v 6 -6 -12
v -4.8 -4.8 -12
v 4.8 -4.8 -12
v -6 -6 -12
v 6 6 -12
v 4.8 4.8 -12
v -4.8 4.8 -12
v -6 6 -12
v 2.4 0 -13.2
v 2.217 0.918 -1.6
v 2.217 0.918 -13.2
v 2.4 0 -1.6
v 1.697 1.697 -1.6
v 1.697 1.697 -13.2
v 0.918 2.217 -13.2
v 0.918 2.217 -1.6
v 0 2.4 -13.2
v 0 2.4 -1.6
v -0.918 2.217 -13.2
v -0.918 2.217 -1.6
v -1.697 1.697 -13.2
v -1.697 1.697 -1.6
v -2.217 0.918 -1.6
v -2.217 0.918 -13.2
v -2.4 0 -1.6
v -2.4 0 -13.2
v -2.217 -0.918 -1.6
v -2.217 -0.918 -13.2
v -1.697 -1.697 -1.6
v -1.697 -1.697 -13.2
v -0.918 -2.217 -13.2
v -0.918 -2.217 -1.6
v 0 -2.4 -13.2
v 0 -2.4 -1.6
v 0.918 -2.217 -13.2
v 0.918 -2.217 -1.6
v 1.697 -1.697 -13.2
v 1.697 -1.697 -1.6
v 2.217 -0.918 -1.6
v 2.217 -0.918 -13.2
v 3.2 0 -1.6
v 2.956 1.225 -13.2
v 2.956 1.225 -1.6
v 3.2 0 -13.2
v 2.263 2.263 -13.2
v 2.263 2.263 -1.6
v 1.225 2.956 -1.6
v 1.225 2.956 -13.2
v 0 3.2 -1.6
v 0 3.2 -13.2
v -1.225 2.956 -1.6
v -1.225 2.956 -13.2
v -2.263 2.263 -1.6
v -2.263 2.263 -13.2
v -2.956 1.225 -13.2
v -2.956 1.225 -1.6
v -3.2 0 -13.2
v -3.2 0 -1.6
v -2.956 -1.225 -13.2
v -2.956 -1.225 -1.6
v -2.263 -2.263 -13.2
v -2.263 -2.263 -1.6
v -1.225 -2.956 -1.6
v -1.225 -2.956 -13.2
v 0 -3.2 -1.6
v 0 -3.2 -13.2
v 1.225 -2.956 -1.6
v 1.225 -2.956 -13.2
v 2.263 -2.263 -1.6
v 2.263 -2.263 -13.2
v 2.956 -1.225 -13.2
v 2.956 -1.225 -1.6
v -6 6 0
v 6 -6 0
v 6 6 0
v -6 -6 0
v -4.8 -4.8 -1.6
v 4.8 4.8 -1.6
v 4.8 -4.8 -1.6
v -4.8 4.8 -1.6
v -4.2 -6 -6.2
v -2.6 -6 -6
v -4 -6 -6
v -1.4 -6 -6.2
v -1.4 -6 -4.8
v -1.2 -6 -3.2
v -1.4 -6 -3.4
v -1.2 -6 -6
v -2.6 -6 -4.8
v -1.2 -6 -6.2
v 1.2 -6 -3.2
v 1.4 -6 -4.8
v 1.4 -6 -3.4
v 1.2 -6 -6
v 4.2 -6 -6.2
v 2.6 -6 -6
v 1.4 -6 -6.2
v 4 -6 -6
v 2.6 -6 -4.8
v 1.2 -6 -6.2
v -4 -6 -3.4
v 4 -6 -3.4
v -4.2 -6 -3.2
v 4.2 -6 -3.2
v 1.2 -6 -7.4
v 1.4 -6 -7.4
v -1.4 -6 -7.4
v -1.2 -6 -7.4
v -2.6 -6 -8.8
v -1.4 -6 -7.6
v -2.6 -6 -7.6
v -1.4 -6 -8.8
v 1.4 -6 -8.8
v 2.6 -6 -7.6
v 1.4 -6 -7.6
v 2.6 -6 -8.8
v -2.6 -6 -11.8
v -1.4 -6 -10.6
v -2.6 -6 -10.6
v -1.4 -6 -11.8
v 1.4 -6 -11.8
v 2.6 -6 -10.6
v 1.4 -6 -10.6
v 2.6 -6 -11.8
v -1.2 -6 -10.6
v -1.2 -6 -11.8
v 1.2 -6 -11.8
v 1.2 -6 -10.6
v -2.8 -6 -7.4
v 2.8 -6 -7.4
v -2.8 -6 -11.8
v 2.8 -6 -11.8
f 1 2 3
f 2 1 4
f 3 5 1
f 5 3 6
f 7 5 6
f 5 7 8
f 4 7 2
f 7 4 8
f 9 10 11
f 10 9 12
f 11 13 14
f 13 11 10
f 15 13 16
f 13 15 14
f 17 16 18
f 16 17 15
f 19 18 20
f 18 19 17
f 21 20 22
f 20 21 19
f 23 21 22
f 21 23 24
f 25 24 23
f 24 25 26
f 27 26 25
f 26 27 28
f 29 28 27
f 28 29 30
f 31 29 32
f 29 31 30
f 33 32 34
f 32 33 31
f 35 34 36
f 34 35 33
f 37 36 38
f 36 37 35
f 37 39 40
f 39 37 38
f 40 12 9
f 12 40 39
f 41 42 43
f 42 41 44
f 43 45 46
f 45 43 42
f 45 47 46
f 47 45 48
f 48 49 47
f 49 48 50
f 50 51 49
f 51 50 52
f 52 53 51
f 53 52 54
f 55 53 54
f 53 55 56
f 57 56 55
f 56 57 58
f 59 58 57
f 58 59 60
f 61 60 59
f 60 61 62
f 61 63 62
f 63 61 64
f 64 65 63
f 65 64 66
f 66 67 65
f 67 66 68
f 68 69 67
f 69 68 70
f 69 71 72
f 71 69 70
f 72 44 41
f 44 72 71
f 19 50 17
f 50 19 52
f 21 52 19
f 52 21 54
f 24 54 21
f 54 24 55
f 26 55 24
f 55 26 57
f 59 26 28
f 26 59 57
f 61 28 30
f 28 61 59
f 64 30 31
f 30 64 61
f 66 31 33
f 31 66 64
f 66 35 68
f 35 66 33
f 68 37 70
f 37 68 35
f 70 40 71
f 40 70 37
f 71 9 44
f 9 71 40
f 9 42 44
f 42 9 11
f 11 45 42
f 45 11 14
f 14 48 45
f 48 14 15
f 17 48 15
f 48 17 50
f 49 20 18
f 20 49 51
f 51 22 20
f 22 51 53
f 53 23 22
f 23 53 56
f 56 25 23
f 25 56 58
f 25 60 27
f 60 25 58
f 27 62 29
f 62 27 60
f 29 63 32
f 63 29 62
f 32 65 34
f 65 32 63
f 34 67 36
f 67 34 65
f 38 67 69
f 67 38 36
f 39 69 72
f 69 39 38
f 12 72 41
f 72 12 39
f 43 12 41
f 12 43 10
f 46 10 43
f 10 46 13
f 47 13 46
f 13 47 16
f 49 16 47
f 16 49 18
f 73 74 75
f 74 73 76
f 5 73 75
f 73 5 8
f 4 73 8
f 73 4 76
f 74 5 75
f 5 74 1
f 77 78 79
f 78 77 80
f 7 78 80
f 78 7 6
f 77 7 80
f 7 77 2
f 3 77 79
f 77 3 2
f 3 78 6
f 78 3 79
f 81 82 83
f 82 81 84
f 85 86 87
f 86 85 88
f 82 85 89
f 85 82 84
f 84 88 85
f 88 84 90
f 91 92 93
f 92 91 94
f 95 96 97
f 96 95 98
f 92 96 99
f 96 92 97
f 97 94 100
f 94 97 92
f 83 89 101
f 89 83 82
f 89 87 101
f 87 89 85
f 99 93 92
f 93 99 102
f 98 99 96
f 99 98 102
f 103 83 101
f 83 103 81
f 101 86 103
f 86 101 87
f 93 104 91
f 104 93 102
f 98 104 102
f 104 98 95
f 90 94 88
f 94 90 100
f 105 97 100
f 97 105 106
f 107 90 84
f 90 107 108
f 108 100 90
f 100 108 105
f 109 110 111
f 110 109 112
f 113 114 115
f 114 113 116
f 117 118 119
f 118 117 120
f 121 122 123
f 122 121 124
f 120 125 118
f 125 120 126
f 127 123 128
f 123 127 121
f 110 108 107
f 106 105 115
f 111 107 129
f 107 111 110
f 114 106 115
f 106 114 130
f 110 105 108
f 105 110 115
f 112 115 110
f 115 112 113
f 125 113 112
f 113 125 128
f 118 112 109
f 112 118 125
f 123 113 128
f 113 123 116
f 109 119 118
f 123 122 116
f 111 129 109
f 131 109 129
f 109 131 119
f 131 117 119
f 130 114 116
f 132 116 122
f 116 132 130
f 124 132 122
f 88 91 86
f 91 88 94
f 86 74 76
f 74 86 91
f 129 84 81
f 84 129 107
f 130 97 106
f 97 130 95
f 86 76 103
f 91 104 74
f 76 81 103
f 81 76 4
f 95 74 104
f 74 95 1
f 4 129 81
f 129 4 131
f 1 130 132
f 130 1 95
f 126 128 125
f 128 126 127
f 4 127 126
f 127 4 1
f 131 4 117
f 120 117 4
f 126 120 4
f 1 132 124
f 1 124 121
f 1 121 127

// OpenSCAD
// file: ../p/4-4ring3.scad
use <../lib.scad>
$fa=1; $fs=0.2;
function ldraw_lib__4_4ring3(realsolid=false) = [
// 0 Ring  3 x 1.0
// 0 Name: 4-4ring3.dat
// 0 Author: James Jessiman
// 0 !LDRAW_ORG Primitive UPDATE 2009-01
// 0 !LICENSE Licensed under CC BY 2.0 and CC BY 4.0 : see CAreadme.txt
// 
// 0 BFC CERTIFY CCW
  [0,"BFC","CERTIFY"],
  [0,"BFC","CCW"],
// 
// 0 !HISTORY 1998-12-15 [PTadmin] Official Update 1998-10
// 0 !HISTORY 2002-04-05 [hafhead] Added BFC statement
// 0 !HISTORY 2002-04-25 [PTadmin] Official Update 2002-02
// 0 !HISTORY 2007-06-24 [PTadmin] Header formatted for Contributor Agreement
// 0 !HISTORY 2008-07-01 [PTadmin] Official Update 2008-01
// 0 !HISTORY 2008-08-26 [cwdee] Switch polygon winding and rename
// 0 !HISTORY 2009-05-02 [PTadmin] Official Update 2009-01
// 
// 
// 4 16 -1.5308 0 3.6956 -1.1481 0 2.7717 0 0 3 0 0 4
  [4,16,-1.5308,0,3.6956,-1.1481,0,2.7717,0,0,3,0,0,4],
// 4 16 -2.8284 0 2.8284 -2.1213 0 2.1213 -1.1481 0 2.7717 -1.5308 0 3.6956
  [4,16,-2.8284,0,2.8284,-2.1213,0,2.1213,-1.1481,0,2.7717,-1.5308,0,3.6956],
// 4 16 -3.6956 0 1.5308 -2.7717 0 1.1481 -2.1213 0 2.1213 -2.8284 0 2.8284
  [4,16,-3.6956,0,1.5308,-2.7717,0,1.1481,-2.1213,0,2.1213,-2.8284,0,2.8284],
// 4 16 -4 0 0 -3 0 0 -2.7717 0 1.1481 -3.6956 0 1.5308
  [4,16,-4,0,0,-3,0,0,-2.7717,0,1.1481,-3.6956,0,1.5308],
// 4 16 -3.6956 0 -1.5308 -2.7717 0 -1.1481 -3 0 0 -4 0 0
  [4,16,-3.6956,0,-1.5308,-2.7717,0,-1.1481,-3,0,0,-4,0,0],
// 4 16 -2.8284 0 -2.8284 -2.1213 0 -2.1213 -2.7717 0 -1.1481 -3.6956 0 -1.5308
  [4,16,-2.8284,0,-2.8284,-2.1213,0,-2.1213,-2.7717,0,-1.1481,-3.6956,0,-1.5308],
// 4 16 -1.5308 0 -3.6956 -1.1481 0 -2.7717 -2.1213 0 -2.1213 -2.8284 0 -2.8284
  [4,16,-1.5308,0,-3.6956,-1.1481,0,-2.7717,-2.1213,0,-2.1213,-2.8284,0,-2.8284],
// 4 16 0 0 -4 0 0 -3 -1.1481 0 -2.7717 -1.5308 0 -3.6956
  [4,16,0,0,-4,0,0,-3,-1.1481,0,-2.7717,-1.5308,0,-3.6956],
// 4 16 1.5308 0 -3.6956 1.1481 0 -2.7717 0 0 -3 0 0 -4
  [4,16,1.5308,0,-3.6956,1.1481,0,-2.7717,0,0,-3,0,0,-4],
// 4 16 2.8284 0 -2.8284 2.1213 0 -2.1213 1.1481 0 -2.7717 1.5308 0 -3.6956
  [4,16,2.8284,0,-2.8284,2.1213,0,-2.1213,1.1481,0,-2.7717,1.5308,0,-3.6956],
// 4 16 3.6956 0 -1.5308 2.7717 0 -1.1481 2.1213 0 -2.1213 2.8284 0 -2.8284
  [4,16,3.6956,0,-1.5308,2.7717,0,-1.1481,2.1213,0,-2.1213,2.8284,0,-2.8284],
// 4 16 4 0 0 3 0 0 2.7717 0 -1.1481 3.6956 0 -1.5308
  [4,16,4,0,0,3,0,0,2.7717,0,-1.1481,3.6956,0,-1.5308],
// 4 16 3.6956 0 1.5308 2.7717 0 1.1481 3 0 0 4 0 0
  [4,16,3.6956,0,1.5308,2.7717,0,1.1481,3,0,0,4,0,0],
// 4 16 2.8284 0 2.8284 2.1213 0 2.1213 2.7717 0 1.1481 3.6956 0 1.5308
  [4,16,2.8284,0,2.8284,2.1213,0,2.1213,2.7717,0,1.1481,3.6956,0,1.5308],
// 4 16 1.5308 0 3.6956 1.1481 0 2.7717 2.1213 0 2.1213 2.8284 0 2.8284
  [4,16,1.5308,0,3.6956,1.1481,0,2.7717,2.1213,0,2.1213,2.8284,0,2.8284],
// 4 16 0 0 4 0 0 3 1.1481 0 2.7717 1.5308 0 3.6956
  [4,16,0,0,4,0,0,3,1.1481,0,2.7717,1.5308,0,3.6956],
// 0
];
module ldraw_lib__4_4ring3(step=0, col=false, unit=2/5, alt=false, line=0.2, solid=!$preview)
    makepoly(ldraw_lib__4_4ring3(solid), step=step, col=col, unit=unit, alt=alt, line=line, solid=solid);
ldraw_lib__4_4ring3(line=0.2);
// file: ../p/4-4edge.scad
use <../lib.scad>
function ldraw_lib__4_4edge() = [
// 0 Circle 1.0
// 0 Name: 4-4edge.dat
// 0 Author: James Jessiman
// 0 !LDRAW_ORG Primitive UPDATE 2017-01
// 0 !LICENSE Licensed under CC BY 2.0 and CC BY 4.0 : see CAreadme.txt
// 
// 0 BFC CERTIFY CCW
  [0,"BFC","CERTIFY"],
  [0,"BFC","CCW"],
// 
// 0 !HISTORY 1998-12-15 [PTadmin] Official Update 1998-10
// 0 !HISTORY 2005-12-28 [PTadmin] Official Update 2005-01
// 0 !HISTORY 2007-06-24 [PTadmin] Header formatted for Contributor Agreement
// 0 !HISTORY 2008-07-01 [PTadmin] Official Update 2008-01
// 0 !HISTORY 2017-01-15 [Steffen] BFCed
// 0 !HISTORY 2017-12-30 [PTadmin] Official Update 2017-01
// 
// 
// 2 24 1 0 0 0.9239 0 0.3827
  [2,24,1,0,0,0.9239,0,0.3827],
// 2 24 0.9239 0 0.3827 0.7071 0 0.7071
  [2,24,0.9239,0,0.3827,0.7071,0,0.7071],
// 2 24 0.7071 0 0.7071 0.3827 0 0.9239
  [2,24,0.7071,0,0.7071,0.3827,0,0.9239],
// 2 24 0.3827 0 0.9239 0 0 1
  [2,24,0.3827,0,0.9239,0,0,1],
// 2 24 0 0 1 -0.3827 0 0.9239
  [2,24,0,0,1,-0.3827,0,0.9239],
// 2 24 -0.3827 0 0.9239 -0.7071 0 0.7071
  [2,24,-0.3827,0,0.9239,-0.7071,0,0.7071],
// 2 24 -0.7071 0 0.7071 -0.9239 0 0.3827
  [2,24,-0.7071,0,0.7071,-0.9239,0,0.3827],
// 2 24 -0.9239 0 0.3827 -1 0 -0
  [2,24,-0.9239,0,0.3827,-1,0,-0],
// 2 24 -1 0 -0 -0.9239 0 -0.3827
  [2,24,-1,0,-0,-0.9239,0,-0.3827],
// 2 24 -0.9239 0 -0.3827 -0.7071 0 -0.7071
  [2,24,-0.9239,0,-0.3827,-0.7071,0,-0.7071],
// 2 24 -0.7071 0 -0.7071 -0.3827 0 -0.9239
  [2,24,-0.7071,0,-0.7071,-0.3827,0,-0.9239],
// 2 24 -0.3827 0 -0.9239 0 0 -1
  [2,24,-0.3827,0,-0.9239,0,0,-1],
// 2 24 0 0 -1 0.3827 0 -0.9239
  [2,24,0,0,-1,0.3827,0,-0.9239],
// 2 24 0.3827 0 -0.9239 0.7071 0 -0.7071
  [2,24,0.3827,0,-0.9239,0.7071,0,-0.7071],
// 2 24 0.7071 0 -0.7071 0.9239 0 -0.3827
  [2,24,0.7071,0,-0.7071,0.9239,0,-0.3827],
// 2 24 0.9239 0 -0.3827 1 0 0
  [2,24,0.9239,0,-0.3827,1,0,0],
];
module ldraw_lib__4_4edge(step=0, col=false, unit=2/5, alt=false, line=0.2, solid=!$preview)
    makepoly(ldraw_lib__4_4edge(), step=step, col=col, unit=unit, alt=alt, line=line, solid=solid);
ldraw_lib__4_4edge(line=0.2);
// file: ../p/4-4cyli.scad
use <../lib.scad>
$fa=1; $fs=0.2;
function ldraw_lib__4_4cyli(realsolid=false) = [
// 0 Cylinder 1.0
// 0 Name: 4-4cyli.dat
// 0 Author: James Jessiman
// 0 !LDRAW_ORG Primitive UPDATE 2005-01
// 0 !LICENSE Licensed under CC BY 2.0 and CC BY 4.0 : see CAreadme.txt
// 
// 0 BFC CERTIFY CCW
  [0,"BFC","CERTIFY"],
  [0,"BFC","CCW"],
// 
// 0 !HISTORY 1998-12-15 [PTadmin] Official Update 1998-10
// 0 !HISTORY 2002-03-23 [sbliss] Added BFC statement; merged headers from files in distributions LDraw 0.27 and Complete.
// 0 !HISTORY 2002-04-25 [PTadmin] Official Update 2002-02
// 0 !HISTORY 2004-12-14 [guyvivan] BFC CCW
// 0 !HISTORY 2005-12-28 [PTadmin] Official Update 2005-01
// 0 !HISTORY 2007-06-24 [PTadmin] Header formatted for Contributor Agreement
// 0 !HISTORY 2008-07-01 [PTadmin] Official Update 2008-01
// 
// 
// 4 16 1 1 0 0.9239 1 0.3827 0.9239 0 0.3827 1 0 0
  [4,16,1,1,0,0.9239,1,0.3827,0.9239,0,0.3827,1,0,0],
// 5 24 1 0 0 1 1 0 0.9239 0 0.3827 0.9239 0 -0.3827
  [5,24,1,0,0,1,1,0,0.9239,0,0.3827,0.9239,0,-0.3827],
// 4 16 0.9239 1 0.3827 0.7071 1 0.7071 0.7071 0 0.7071 0.9239 0 0.3827
  [4,16,0.9239,1,0.3827,0.7071,1,0.7071,0.7071,0,0.7071,0.9239,0,0.3827],
// 5 24 0.9239 0 0.3827 0.9239 1 0.3827 0.7071 0 0.7071 1 0 0
  [5,24,0.9239,0,0.3827,0.9239,1,0.3827,0.7071,0,0.7071,1,0,0],
// 4 16 0.7071 1 0.7071 0.3827 1 0.9239 0.3827 0 0.9239 0.7071 0 0.7071
  [4,16,0.7071,1,0.7071,0.3827,1,0.9239,0.3827,0,0.9239,0.7071,0,0.7071],
// 5 24 0.7071 0 0.7071 0.7071 1 0.7071 0.3827 0 0.9239 0.9239 0 0.3827
  [5,24,0.7071,0,0.7071,0.7071,1,0.7071,0.3827,0,0.9239,0.9239,0,0.3827],
// 4 16 0.3827 1 0.9239 0 1 1 0 0 1 0.3827 0 0.9239
  [4,16,0.3827,1,0.9239,0,1,1,0,0,1,0.3827,0,0.9239],
// 5 24 0.3827 0 0.9239 0.3827 1 0.9239 0 0 1 0.7071 0 0.7071
  [5,24,0.3827,0,0.9239,0.3827,1,0.9239,0,0,1,0.7071,0,0.7071],
// 4 16 0 1 1 -0.3827 1 0.9239 -0.3827 0 0.9239 0 0 1
  [4,16,0,1,1,-0.3827,1,0.9239,-0.3827,0,0.9239,0,0,1],
// 5 24 0 0 1 0 1 1 -0.3827 0 0.9239 0.3827 0 0.9239
  [5,24,0,0,1,0,1,1,-0.3827,0,0.9239,0.3827,0,0.9239],
// 4 16 -0.3827 1 0.9239 -0.7071 1 0.7071 -0.7071 0 0.7071 -0.3827 0 0.9239
  [4,16,-0.3827,1,0.9239,-0.7071,1,0.7071,-0.7071,0,0.7071,-0.3827,0,0.9239],
// 5 24 -0.3827 0 0.9239 -0.3827 1 0.9239 -0.7071 0 0.7071 0 0 1
  [5,24,-0.3827,0,0.9239,-0.3827,1,0.9239,-0.7071,0,0.7071,0,0,1],
// 4 16 -0.7071 1 0.7071 -0.9239 1 0.3827 -0.9239 0 0.3827 -0.7071 0 0.7071
  [4,16,-0.7071,1,0.7071,-0.9239,1,0.3827,-0.9239,0,0.3827,-0.7071,0,0.7071],
// 5 24 -0.7071 0 0.7071 -0.7071 1 0.7071 -0.9239 0 0.3827 -0.3827 0 0.9239
  [5,24,-0.7071,0,0.7071,-0.7071,1,0.7071,-0.9239,0,0.3827,-0.3827,0,0.9239],
// 4 16 -0.9239 1 0.3827 -1 1 0 -1 0 0 -0.9239 0 0.3827
  [4,16,-0.9239,1,0.3827,-1,1,0,-1,0,0,-0.9239,0,0.3827],
// 5 24 -0.9239 0 0.3827 -0.9239 1 0.3827 -1 0 0 -0.7071 0 0.7071
  [5,24,-0.9239,0,0.3827,-0.9239,1,0.3827,-1,0,0,-0.7071,0,0.7071],
// 4 16 -1 1 0 -0.9239 1 -0.3827 -0.9239 0 -0.3827 -1 0 0
  [4,16,-1,1,0,-0.9239,1,-0.3827,-0.9239,0,-0.3827,-1,0,0],
// 5 24 -1 0 0 -1 1 0 -0.9239 0 -0.3827 -0.9239 0 0.3827
  [5,24,-1,0,0,-1,1,0,-0.9239,0,-0.3827,-0.9239,0,0.3827],
// 4 16 -0.9239 1 -0.3827 -0.7071 1 -0.7071 -0.7071 0 -0.7071 -0.9239 0 -0.3827
  [4,16,-0.9239,1,-0.3827,-0.7071,1,-0.7071,-0.7071,0,-0.7071,-0.9239,0,-0.3827],
// 5 24 -0.9239 0 -0.3827 -0.9239 1 -0.3827 -0.7071 0 -0.7071 -1 0 0
  [5,24,-0.9239,0,-0.3827,-0.9239,1,-0.3827,-0.7071,0,-0.7071,-1,0,0],
// 4 16 -0.7071 1 -0.7071 -0.3827 1 -0.9239 -0.3827 0 -0.9239 -0.7071 0 -0.7071
  [4,16,-0.7071,1,-0.7071,-0.3827,1,-0.9239,-0.3827,0,-0.9239,-0.7071,0,-0.7071],
// 5 24 -0.7071 0 -0.7071 -0.7071 1 -0.7071 -0.3827 0 -0.9239 -0.9239 0 -0.3827
  [5,24,-0.7071,0,-0.7071,-0.7071,1,-0.7071,-0.3827,0,-0.9239,-0.9239,0,-0.3827],
// 4 16 -0.3827 1 -0.9239 0 1 -1 0 0 -1 -0.3827 0 -0.9239
  [4,16,-0.3827,1,-0.9239,0,1,-1,0,0,-1,-0.3827,0,-0.9239],
// 5 24 -0.3827 0 -0.9239 -0.3827 1 -0.9239 0 0 -1 -0.7071 0 -0.7071
  [5,24,-0.3827,0,-0.9239,-0.3827,1,-0.9239,0,0,-1,-0.7071,0,-0.7071],
// 4 16 0 1 -1 0.3827 1 -0.9239 0.3827 0 -0.9239 0 0 -1
  [4,16,0,1,-1,0.3827,1,-0.9239,0.3827,0,-0.9239,0,0,-1],
// 5 24 0 0 -1 0 1 -1 0.3827 0 -0.9239 -0.3827 0 -0.9239
  [5,24,0,0,-1,0,1,-1,0.3827,0,-0.9239,-0.3827,0,-0.9239],
// 4 16 0.3827 1 -0.9239 0.7071 1 -0.7071 0.7071 0 -0.7071 0.3827 0 -0.9239
  [4,16,0.3827,1,-0.9239,0.7071,1,-0.7071,0.7071,0,-0.7071,0.3827,0,-0.9239],
// 5 24 0.3827 0 -0.9239 0.3827 1 -0.9239 0.7071 0 -0.7071 0 0 -1
  [5,24,0.3827,0,-0.9239,0.3827,1,-0.9239,0.7071,0,-0.7071,0,0,-1],
// 4 16 0.7071 1 -0.7071 0.9239 1 -0.3827 0.9239 0 -0.3827 0.7071 0 -0.7071
  [4,16,0.7071,1,-0.7071,0.9239,1,-0.3827,0.9239,0,-0.3827,0.7071,0,-0.7071],
// 5 24 0.7071 0 -0.7071 0.7071 1 -0.7071 0.9239 0 -0.3827 0.3827 0 -0.9239
  [5,24,0.7071,0,-0.7071,0.7071,1,-0.7071,0.9239,0,-0.3827,0.3827,0,-0.9239],
// 4 16 0.9239 1 -0.3827 1 1 0 1 0 0 0.9239 0 -0.3827
  [4,16,0.9239,1,-0.3827,1,1,0,1,0,0,0.9239,0,-0.3827],
// 5 24 0.9239 0 -0.3827 0.9239 1 -0.3827 1 0 0 0.7071 0 -0.7071
  [5,24,0.9239,0,-0.3827,0.9239,1,-0.3827,1,0,0,0.7071,0,-0.7071],
// 0
];
module ldraw_lib__4_4cyli(step=0, col=false, unit=2/5, alt=false, line=0.2, solid=!$preview)
    makepoly(ldraw_lib__4_4cyli(solid), step=step, col=col, unit=unit, alt=alt, line=line, solid=solid);
ldraw_lib__4_4cyli(line=0.2);
// file: ../p/stud4.scad
use <../lib.scad>
use <4-4cyli.scad>
use <4-4edge.scad>
use <4-4ring3.scad>
function ldraw_lib__stud4() = [
// 0 Stud Tube Open
// 0 Name: stud4.dat
// 0 Author: James Jessiman
// 0 !LDRAW_ORG Primitive UPDATE 2009-02
// 0 !LICENSE Licensed under CC BY 4.0 : see CAreadme.txt
// 
// 0 BFC CERTIFY CCW
  [0,"BFC","CERTIFY"],
  [0,"BFC","CCW"],
// 
// 0 !HISTORY 1999-07-05 [PTadmin] Official Update 1999-05
// 0 !HISTORY 2002-04-04 [sbliss] Modified for BFC compliance
// 0 !HISTORY 2002-04-25 [PTadmin] Official Update 2002-02
// 0 !HISTORY 2007-06-24 [PTadmin] Header formatted for Contributor Agreement
// 0 !HISTORY 2008-07-01 [PTadmin] Official Update 2008-01
// 0 !HISTORY 2009-06-21 [cwdee] Update ring references to 4-4ring
// 0 !HISTORY 2009-09-03 [PTadmin] Official Update 2009-02
// 
// 
// 1 16 0 -4 0 6 0 0 0 1 0 0 0 6 4-4edge.dat
  [1,16,0,-4,0,6,0,0,0,1,0,0,0,6, ldraw_lib__4_4edge()],
// 1 16 0 -4 0 8 0 0 0 1 0 0 0 8 4-4edge.dat
  [1,16,0,-4,0,8,0,0,0,1,0,0,0,8, ldraw_lib__4_4edge()],
// 1 16 0 0 0 6 0 0 0 1 0 0 0 6 4-4edge.dat
  [1,16,0,0,0,6,0,0,0,1,0,0,0,6, ldraw_lib__4_4edge()],
// 1 16 0 0 0 8 0 0 0 1 0 0 0 8 4-4edge.dat
  [1,16,0,0,0,8,0,0,0,1,0,0,0,8, ldraw_lib__4_4edge()],
// 0 BFC INVERTNEXT
  [0,"BFC","INVERTNEXT"],
// 1 16 0 -4 0 6 0 0 0 4 0 0 0 6 4-4cyli.dat
  [1,16,0,-4,0,6,0,0,0,4,0,0,0,6, ldraw_lib__4_4cyli()],
// 1 16 0 -4 0 8 0 0 0 4 0 0 0 8 4-4cyli.dat
  [1,16,0,-4,0,8,0,0,0,4,0,0,0,8, ldraw_lib__4_4cyli()],
// 1 16 0 -4 0 2 0 0 0 1 0 0 0 2 4-4ring3.dat
  [1,16,0,-4,0,2,0,0,0,1,0,0,0,2, ldraw_lib__4_4ring3()],
  [-1,16,0,0,0,2,0,0,0,-1,0,0,0,2, ldraw_lib__4_4ring3()],
// 0
];
module ldraw_lib__stud4(step=0, col=false, unit=2/5, alt=false, line=0.2, solid=!$preview)
    makepoly(ldraw_lib__stud4(), step=step, col=col, unit=unit, alt=alt, line=line, solid=solid);
ldraw_lib__stud4(line=0.2);
// file: ../p/box5.scad
use <../lib.scad>
function ldraw_lib__box5() = [
// 0 Box with 5 Faces and All Edges
// 0 Name: box5.dat
// 0 Author: James Jessiman
// 0 !LDRAW_ORG Primitive UPDATE 2012-01
// 0 !LICENSE Licensed under CC BY 2.0 and CC BY 4.0 : see CAreadme.txt
// 
// 0 BFC CERTIFY CCW
  [0,"BFC","CERTIFY"],
  [0,"BFC","CCW"],
// 
// 0 !HISTORY 2002-04-03 [sbliss] Modified for BFC compliance
// 0 !HISTORY 2002-04-25 [PTadmin] Official Update 2002-02
// 0 !HISTORY 2007-06-24 [PTadmin] Header formatted for Contributor Agreement
// 0 !HISTORY 2008-07-01 [PTadmin] Official Update 2008-01
// 0 !HISTORY 2012-02-16 [Philo] Changed to CCW
// 0 !HISTORY 2012-03-30 [PTadmin] Official Update 2012-01
// 
// 
// 2 24 1 1 1 -1 1 1
  [2,24,1,1,1,-1,1,1],
// 2 24 -1 1 1 -1 1 -1
  [2,24,-1,1,1,-1,1,-1],
// 2 24 -1 1 -1 1 1 -1
  [2,24,-1,1,-1,1,1,-1],
// 2 24 1 1 -1 1 1 1
  [2,24,1,1,-1,1,1,1],
// 2 24 1 0 1 -1 0 1
  [2,24,1,0,1,-1,0,1],
// 2 24 -1 0 1 -1 0 -1
  [2,24,-1,0,1,-1,0,-1],
// 2 24 -1 0 -1 1 0 -1
  [2,24,-1,0,-1,1,0,-1],
// 2 24 1 0 -1 1 0 1
  [2,24,1,0,-1,1,0,1],
// 2 24 1 0 1 1 1 1
  [2,24,1,0,1,1,1,1],
// 2 24 -1 0 1 -1 1 1
  [2,24,-1,0,1,-1,1,1],
// 2 24 1 0 -1 1 1 -1
  [2,24,1,0,-1,1,1,-1],
// 2 24 -1 0 -1 -1 1 -1
  [2,24,-1,0,-1,-1,1,-1],
// 4 16 -1 1 1 1 1 1 1 1 -1 -1 1 -1
  [4,16,-1,1,1,1,1,1,1,1,-1,-1,1,-1],
// 4 16 -1 1 1 -1 0 1 1 0 1 1 1 1
  [4,16,-1,1,1,-1,0,1,1,0,1,1,1,1],
// 4 16 -1 1 -1 -1 0 -1 -1 0 1 -1 1 1
  [4,16,-1,1,-1,-1,0,-1,-1,0,1,-1,1,1],
// 4 16 1 1 -1 1 0 -1 -1 0 -1 -1 1 -1
  [4,16,1,1,-1,1,0,-1,-1,0,-1,-1,1,-1],
// 4 16 1 1 1 1 0 1 1 0 -1 1 1 -1
  [4,16,1,1,1,1,0,1,1,0,-1,1,1,-1],
];
makepoly(ldraw_lib__box5(), line=0.2);
// file: ../p/box4t.scad
use <../lib.scad>
function ldraw_lib__box4t() = [
// 0 Box with 4 Adjacent Faces and All Edges
// 0 Name: box4t.dat
// 0 Author: Tore Eriksson [Tore_Eriksson]
// 0 !LDRAW_ORG Primitive UPDATE 2003-02
// 0 !LICENSE Licensed under CC BY 2.0 and CC BY 4.0 : see CAreadme.txt
// 
// 0 BFC CERTIFY CCW
  [0,"BFC","CERTIFY"],
  [0,"BFC","CCW"],
// 
// 0 !HISTORY 1997-09-29 [PTadmin] Official Update 1997-15
// 0 !HISTORY 2002-08-31 [izanette] Modified with WINDZ for BFC compliance
// 0 !HISTORY 2003-08-01 [PTadmin] Official Update 2003-02
// 0 !HISTORY 2007-06-24 [PTadmin] Header formatted for Contributor Agreement
// 0 !HISTORY 2008-07-01 [PTadmin] Official Update 2008-01
// 
// 
// 2 24 1 1 1 -1 1 1
  [2,24,1,1,1,-1,1,1],
// 2 24 -1 1 1 -1 1 -1
  [2,24,-1,1,1,-1,1,-1],
// 2 24 -1 1 -1 1 1 -1
  [2,24,-1,1,-1,1,1,-1],
// 2 24 1 1 -1 1 1 1
  [2,24,1,1,-1,1,1,1],
// 2 24 1 0 1 -1 0 1
  [2,24,1,0,1,-1,0,1],
// 2 24 -1 0 1 -1 0 -1
  [2,24,-1,0,1,-1,0,-1],
// 2 24 -1 0 -1 1 0 -1
  [2,24,-1,0,-1,1,0,-1],
// 2 24 1 0 -1 1 0 1
  [2,24,1,0,-1,1,0,1],
// 2 24 1 0 1 1 1 1
  [2,24,1,0,1,1,1,1],
// 2 24 -1 0 1 -1 1 1
  [2,24,-1,0,1,-1,1,1],
// 2 24 1 0 -1 1 1 -1
  [2,24,1,0,-1,1,1,-1],
// 2 24 -1 0 -1 -1 1 -1
  [2,24,-1,0,-1,-1,1,-1],
// 4 16 1 1 1 1 1 -1 -1 1 -1 -1 1 1
  [4,16,1,1,1,1,1,-1,-1,1,-1,-1,1,1],
// 4 16 1 1 1 -1 1 1 -1 0 1 1 0 1
  [4,16,1,1,1,-1,1,1,-1,0,1,1,0,1],
// 4 16 -1 1 1 -1 1 -1 -1 0 -1 -1 0 1
  [4,16,-1,1,1,-1,1,-1,-1,0,-1,-1,0,1],
// 0 4 16 -1 1 -1 -1 0 -1 1 0 -1 1 1 -1
// 4 16 1 1 -1 1 1 1 1 0 1 1 0 -1
  [4,16,1,1,-1,1,1,1,1,0,1,1,0,-1],
// 0
];
makepoly(ldraw_lib__box4t(), line=0.2);
// file: s/19729s01.scad
use <../../lib.scad>
use <../../p/box4t.scad>
use <../../p/box5.scad>
use <../../p/stud4.scad>
function ldraw_lib__s__19729s01() = [
// 0 ~Minifig Head Cuboid without Front Surface
// 0 Name: s\19729s01.dat
// 0 Author: Mark Kennedy [mkennedy]
// 0 !LDRAW_ORG Subpart UPDATE 2016-01
// 0 !LICENSE Licensed under CC BY 4.0 : see CAreadme.txt
// 
// 0 BFC CERTIFY CW
  [0,"BFC","CERTIFY"],
  [0,"BFC","CW"],
// 
// 0 !HISTORY 2016-03-18 {LEGO Digital Designer} Original part shape
// 0 !HISTORY 2016-03-28 [mkennedy] Primitive substitution
// 0 !HISTORY 2016-12-31 [PTadmin] Official Update 2016-01
// 
// 
// 4 16 15 30 -15 12 30 -12 -12 30 -12 -15 30 -15
  [4,16,15,30,-15,12,30,-12,-12,30,-12,-15,30,-15],
// 4 16 15 30 15 12 30 12 12 30 -12 15 30 -15
  [4,16,15,30,15,12,30,12,12,30,-12,15,30,-15],
// 4 16 -15 30 15 -12 30 12 12 30 12 15 30 15
  [4,16,-15,30,15,-12,30,12,12,30,12,15,30,15],
// 4 16 -15 30 -15 -12 30 -12 -12 30 12 -15 30 15
  [4,16,-15,30,-15,-12,30,-12,-12,30,12,-15,30,15],
// 0
// 1 16 0 4 0 1 0 0 0 -7.25 0 0 0 1 stud4.dat
  [1,16,0,4,0,1,0,0,0,-7.25,0,0,0,1, ldraw_lib__stud4()],
// 1 16 0 30 0 15 0 0 0 -30 0 0 0 15 box4t.dat
  [1,16,0,30,0,15,0,0,0,-30,0,0,0,15, ldraw_lib__box4t()],
// 0 BFC INVERTNEXT
  [0,"BFC","INVERTNEXT"],
// 1 16 0 30 0 12 0 0 0 -26 0 0 0 12 box5.dat
  [1,16,0,30,0,12,0,0,0,-26,0,0,0,12, ldraw_lib__box5()],
// 
];
module ldraw_lib__s__19729s01(step=0, col=false, unit=2/5, alt=false, line=0.2, solid=!$preview)
    makepoly(ldraw_lib__s__19729s01(), step=step, col=col, unit=unit, alt=alt, line=line, solid=solid);
ldraw_lib__s__19729s01(line=0.2);
// main file
use <../lib.scad>
use <s/19729s01.scad>
function ldraw_lib__19729p03() = [
// 0 Minifig Head Cuboid with Minecraft Creeper Pattern
// 0 Name: 19729p03.dat
// 0 Author: Vincent Messenet [Cheenzo]
// 0 !LDRAW_ORG Part UPDATE 2024-04
// 0 !LICENSE Licensed under CC BY 4.0 : see CAreadme.txt
// 
// 0 BFC CERTIFY CCW
  [0,"BFC","CERTIFY"],
  [0,"BFC","CCW"],
// 
// 0 !KEYWORDS BrickLink 19729pb003, Brickowl 391104, Rebrickable 19729pr0006
// 0 !KEYWORDS Set 21120, Set 21135, Set 21137, set 21184, set 30393
// 
// 0 !HISTORY 2024-05-28 [OrionP] Official Update 2024-04
// 
// 1 16 0 0 0 1 0 0 0 1 0 0 0 1 s\19729s01.dat
  [1,16,0,0,0,1,0,0,0,1,0,0,0,1, ldraw_lib__s__19729s01()],
// 
// 4 0 -6.5 15 -15 -10 15 -15 -10.5 15.5 -15 -3.5 15.5 -15
  [4,0,-6.5,15,-15,-10,15,-15,-10.5,15.5,-15,-3.5,15.5,-15],
// 4 0 -3 8 -15 -3.5 8.5 -15 -3.5 12 -15 -3 15 -15
  [4,0,-3,8,-15,-3.5,8.5,-15,-3.5,12,-15,-3,15,-15],
// 4 0 -3.5 12 -15 -6.5 12 -15 -6.5 15 -15 -3.5 15.5 -15
  [4,0,-3.5,12,-15,-6.5,12,-15,-6.5,15,-15,-3.5,15.5,-15],
// 4 0 -3 15 -15 -3.5 12 -15 -3.5 15.5 -15 -3 15.5 -15
  [4,0,-3,15,-15,-3.5,12,-15,-3.5,15.5,-15,-3,15.5,-15],
// 4 0 3.5 12 -15 3.5 8.5 -15 3 8 -15 3 15 -15
  [4,0,3.5,12,-15,3.5,8.5,-15,3,8,-15,3,15,-15],
// 4 0 10.5 15.5 -15 10 15 -15 6.5 15 -15 3.5 15.5 -15
  [4,0,10.5,15.5,-15,10,15,-15,6.5,15,-15,3.5,15.5,-15],
// 4 0 6.5 15 -15 6.5 12 -15 3.5 12 -15 3.5 15.5 -15
  [4,0,6.5,15,-15,6.5,12,-15,3.5,12,-15,3.5,15.5,-15],
// 4 0 3.5 15.5 -15 3.5 12 -15 3 15 -15 3 15.5 -15
  [4,0,3.5,15.5,-15,3.5,12,-15,3,15,-15,3,15.5,-15],
// 4 288 -10 15 -15 -6.5 15 -15 -6.5 12 -15 -10 8.5 -15
  [4,288,-10,15,-15,-6.5,15,-15,-6.5,12,-15,-10,8.5,-15],
// 4 288 -3.5 8.5 -15 -10 8.5 -15 -6.5 12 -15 -3.5 12 -15
  [4,288,-3.5,8.5,-15,-10,8.5,-15,-6.5,12,-15,-3.5,12,-15],
// 4 288 3.5 8.5 -15 3.5 12 -15 6.5 12 -15 10 8.5 -15
  [4,288,3.5,8.5,-15,3.5,12,-15,6.5,12,-15,10,8.5,-15],
// 4 288 10 15 -15 10 8.5 -15 6.5 12 -15 6.5 15 -15
  [4,288,10,15,-15,10,8.5,-15,6.5,12,-15,6.5,15,-15],
// 4 0 -10.5 8 -15 -10.5 15.5 -15 -10 15 -15 -10 8.5 -15
  [4,0,-10.5,8,-15,-10.5,15.5,-15,-10,15,-15,-10,8.5,-15],
// 4 0 -3 8 -15 -10.5 8 -15 -10 8.5 -15 -3.5 8.5 -15
  [4,0,-3,8,-15,-10.5,8,-15,-10,8.5,-15,-3.5,8.5,-15],
// 4 0 10.5 8 -15 3 8 -15 3.5 8.5 -15 10 8.5 -15
  [4,0,10.5,8,-15,3,8,-15,3.5,8.5,-15,10,8.5,-15],
// 4 0 10 15 -15 10.5 15.5 -15 10.5 8 -15 10 8.5 -15
  [4,0,10,15,-15,10.5,15.5,-15,10.5,8,-15,10,8.5,-15],
// 4 0 -3 15 -15 -3 15.5 -15 3 15.5 -15 3 15 -15
  [4,0,-3,15,-15,-3,15.5,-15,3,15.5,-15,3,15,-15],
// 4 0 3.5 15.5 -15 3 15.5 -15 3 18.5 -15 3.5 18.5 -15
  [4,0,3.5,15.5,-15,3,15.5,-15,3,18.5,-15,3.5,18.5,-15],
// 4 0 -3 15.5 -15 -3.5 15.5 -15 -3.5 18.5 -15 -3 18.5 -15
  [4,0,-3,15.5,-15,-3.5,15.5,-15,-3.5,18.5,-15,-3,18.5,-15],
// 4 288 -3 15.5 -15 -3 18.5 -15 3 18.5 -15 3 15.5 -15
  [4,288,-3,15.5,-15,-3,18.5,-15,3,18.5,-15,3,15.5,-15],
// 4 288 -3.5 22 -15 -3.5 19 -15 -6.5 19 -15 -6.5 22 -15
  [4,288,-3.5,22,-15,-3.5,19,-15,-6.5,19,-15,-6.5,22,-15],
// 4 288 3.5 22 -15 6.5 22 -15 6.5 19 -15 3.5 19 -15
  [4,288,3.5,22,-15,6.5,22,-15,6.5,19,-15,3.5,19,-15],
// 4 288 -3.5 29.5 -15 -3.5 26.5 -15 -6.5 26.5 -15 -6.5 29.5 -15
  [4,288,-3.5,29.5,-15,-3.5,26.5,-15,-6.5,26.5,-15,-6.5,29.5,-15],
// 4 288 3.5 26.5 -15 3.5 29.5 -15 6.5 29.5 -15 6.5 26.5 -15
  [4,288,3.5,26.5,-15,3.5,29.5,-15,6.5,29.5,-15,6.5,26.5,-15],
// 4 0 -3.5 26.5 -15 -3.5 29.5 -15 -3 29.5 -15 -3 26.5 -15
  [4,0,-3.5,26.5,-15,-3.5,29.5,-15,-3,29.5,-15,-3,26.5,-15],
// 4 0 3.5 29.5 -15 3.5 26.5 -15 3 26.5 -15 3 29.5 -15
  [4,0,3.5,29.5,-15,3.5,26.5,-15,3,26.5,-15,3,29.5,-15],
// 3 0 -3.5 19 -15 -3 18.5 -15 -3.5 18.5 -15
  [3,0,-3.5,19,-15,-3,18.5,-15,-3.5,18.5,-15],
// 3 0 3.5 18.5 -15 3 18.5 -15 3.5 19 -15
  [3,0,3.5,18.5,-15,3,18.5,-15,3.5,19,-15],
// 4 0 -6.5 19 -15 -3.5 19 -15 -3.5 18.5 -15 -7 18.5 -15
  [4,0,-6.5,19,-15,-3.5,19,-15,-3.5,18.5,-15,-7,18.5,-15],
// 4 0 3.5 19 -15 6.5 19 -15 7 18.5 -15 3.5 18.5 -15
  [4,0,3.5,19,-15,6.5,19,-15,7,18.5,-15,3.5,18.5,-15],
// 4 0 3 18.5 -15 -3 18.5 -15 -3.5 19 -15 3.5 19 -15
  [4,0,3,18.5,-15,-3,18.5,-15,-3.5,19,-15,3.5,19,-15],
// 4 0 -3.5 22 -15 3.5 22 -15 3.5 19 -15 -3.5 19 -15
  [4,0,-3.5,22,-15,3.5,22,-15,3.5,19,-15,-3.5,19,-15],
// 4 0 -3 26.5 -15 3 26.5 -15 3.5 22 -15 -3.5 22 -15
  [4,0,-3,26.5,-15,3,26.5,-15,3.5,22,-15,-3.5,22,-15],
// 4 0 -3.5 26.5 -15 -3 26.5 -15 -3.5 22 -15 -6.5 22 -15
  [4,0,-3.5,26.5,-15,-3,26.5,-15,-3.5,22,-15,-6.5,22,-15],
// 4 0 6.5 22 -15 3.5 22 -15 3 26.5 -15 3.5 26.5 -15
  [4,0,6.5,22,-15,3.5,22,-15,3,26.5,-15,3.5,26.5,-15],
// 3 0 -6.5 22 -15 -6.5 26.5 -15 -3.5 26.5 -15
  [3,0,-6.5,22,-15,-6.5,26.5,-15,-3.5,26.5,-15],
// 3 0 3.5 26.5 -15 6.5 26.5 -15 6.5 22 -15
  [3,0,3.5,26.5,-15,6.5,26.5,-15,6.5,22,-15],
// 3 0 -6.5 19 -15 -7 18.5 -15 -6.5 22 -15
  [3,0,-6.5,19,-15,-7,18.5,-15,-6.5,22,-15],
// 4 0 -6.5 26.5 -15 -6.5 22 -15 -7 18.5 -15 -7 29.5 -15
  [4,0,-6.5,26.5,-15,-6.5,22,-15,-7,18.5,-15,-7,29.5,-15],
// 3 0 -7 29.5 -15 -6.5 29.5 -15 -6.5 26.5 -15
  [3,0,-7,29.5,-15,-6.5,29.5,-15,-6.5,26.5,-15],
// 3 0 7 18.5 -15 6.5 19 -15 6.5 22 -15
  [3,0,7,18.5,-15,6.5,19,-15,6.5,22,-15],
// 4 0 7 18.5 -15 6.5 22 -15 6.5 26.5 -15 7 29.5 -15
  [4,0,7,18.5,-15,6.5,22,-15,6.5,26.5,-15,7,29.5,-15],
// 3 0 6.5 29.5 -15 7 29.5 -15 6.5 26.5 -15
  [3,0,6.5,29.5,-15,7,29.5,-15,6.5,26.5,-15],
// 4 16 -3 8 -15 -3 15 -15 3 15 -15 3 8 -15
  [4,16,-3,8,-15,-3,15,-15,3,15,-15,3,8,-15],
// 4 16 -3 8 -15 3 8 -15 15 0 -15 -15 0 -15
  [4,16,-3,8,-15,3,8,-15,15,0,-15,-15,0,-15],
// 4 16 -7 18.5 -15 -3.5 18.5 -15 -3.5 15.5 -15 -10.5 15.5 -15
  [4,16,-7,18.5,-15,-3.5,18.5,-15,-3.5,15.5,-15,-10.5,15.5,-15],
// 4 16 3.5 15.5 -15 3.5 18.5 -15 7 18.5 -15 10.5 15.5 -15
  [4,16,3.5,15.5,-15,3.5,18.5,-15,7,18.5,-15,10.5,15.5,-15],
// 3 16 -3 8 -15 -15 0 -15 -10.5 8 -15
  [3,16,-3,8,-15,-15,0,-15,-10.5,8,-15],
// 3 16 3 8 -15 10.5 8 -15 15 0 -15
  [3,16,3,8,-15,10.5,8,-15,15,0,-15],
// 4 16 -10.5 15.5 -15 -10.5 8 -15 -15 0 -15 -15 30 -15
  [4,16,-10.5,15.5,-15,-10.5,8,-15,-15,0,-15,-15,30,-15],
// 4 16 15 0 -15 10.5 8 -15 10.5 15.5 -15 15 30 -15
  [4,16,15,0,-15,10.5,8,-15,10.5,15.5,-15,15,30,-15],
// 4 16 -7 18.5 -15 -10.5 15.5 -15 -15 30 -15 -7 29.5 -15
  [4,16,-7,18.5,-15,-10.5,15.5,-15,-15,30,-15,-7,29.5,-15],
// 4 16 15 30 -15 10.5 15.5 -15 7 18.5 -15 7 29.5 -15
  [4,16,15,30,-15,10.5,15.5,-15,7,18.5,-15,7,29.5,-15],
// 4 16 -3 26.5 -15 -3 29.5 -15 3 29.5 -15 3 26.5 -15
  [4,16,-3,26.5,-15,-3,29.5,-15,3,29.5,-15,3,26.5,-15],
// 4 16 3 29.5 -15 -3 29.5 -15 -15 30 -15 15 30 -15
  [4,16,3,29.5,-15,-3,29.5,-15,-15,30,-15,15,30,-15],
// 3 16 -7 29.5 -15 -15 30 -15 -6.5 29.5 -15
  [3,16,-7,29.5,-15,-15,30,-15,-6.5,29.5,-15],
// 3 16 -3.5 29.5 -15 -6.5 29.5 -15 -15 30 -15
  [3,16,-3.5,29.5,-15,-6.5,29.5,-15,-15,30,-15],
// 3 16 -3 29.5 -15 -3.5 29.5 -15 -15 30 -15
  [3,16,-3,29.5,-15,-3.5,29.5,-15,-15,30,-15],
// 3 16 15 30 -15 7 29.5 -15 6.5 29.5 -15
  [3,16,15,30,-15,7,29.5,-15,6.5,29.5,-15],
// 3 16 15 30 -15 6.5 29.5 -15 3.5 29.5 -15
  [3,16,15,30,-15,6.5,29.5,-15,3.5,29.5,-15],
// 3 16 15 30 -15 3.5 29.5 -15 3 29.5 -15
  [3,16,15,30,-15,3.5,29.5,-15,3,29.5,-15],
];
module ldraw_lib__19729p03(step=0, col=false, unit=2/5, alt=false, line=0.2, solid=!$preview)
    makepoly(ldraw_lib__19729p03(), step=step, col=col, unit=unit, alt=alt, line=line, solid=solid);
ldraw_lib__19729p03(line=0.2);
